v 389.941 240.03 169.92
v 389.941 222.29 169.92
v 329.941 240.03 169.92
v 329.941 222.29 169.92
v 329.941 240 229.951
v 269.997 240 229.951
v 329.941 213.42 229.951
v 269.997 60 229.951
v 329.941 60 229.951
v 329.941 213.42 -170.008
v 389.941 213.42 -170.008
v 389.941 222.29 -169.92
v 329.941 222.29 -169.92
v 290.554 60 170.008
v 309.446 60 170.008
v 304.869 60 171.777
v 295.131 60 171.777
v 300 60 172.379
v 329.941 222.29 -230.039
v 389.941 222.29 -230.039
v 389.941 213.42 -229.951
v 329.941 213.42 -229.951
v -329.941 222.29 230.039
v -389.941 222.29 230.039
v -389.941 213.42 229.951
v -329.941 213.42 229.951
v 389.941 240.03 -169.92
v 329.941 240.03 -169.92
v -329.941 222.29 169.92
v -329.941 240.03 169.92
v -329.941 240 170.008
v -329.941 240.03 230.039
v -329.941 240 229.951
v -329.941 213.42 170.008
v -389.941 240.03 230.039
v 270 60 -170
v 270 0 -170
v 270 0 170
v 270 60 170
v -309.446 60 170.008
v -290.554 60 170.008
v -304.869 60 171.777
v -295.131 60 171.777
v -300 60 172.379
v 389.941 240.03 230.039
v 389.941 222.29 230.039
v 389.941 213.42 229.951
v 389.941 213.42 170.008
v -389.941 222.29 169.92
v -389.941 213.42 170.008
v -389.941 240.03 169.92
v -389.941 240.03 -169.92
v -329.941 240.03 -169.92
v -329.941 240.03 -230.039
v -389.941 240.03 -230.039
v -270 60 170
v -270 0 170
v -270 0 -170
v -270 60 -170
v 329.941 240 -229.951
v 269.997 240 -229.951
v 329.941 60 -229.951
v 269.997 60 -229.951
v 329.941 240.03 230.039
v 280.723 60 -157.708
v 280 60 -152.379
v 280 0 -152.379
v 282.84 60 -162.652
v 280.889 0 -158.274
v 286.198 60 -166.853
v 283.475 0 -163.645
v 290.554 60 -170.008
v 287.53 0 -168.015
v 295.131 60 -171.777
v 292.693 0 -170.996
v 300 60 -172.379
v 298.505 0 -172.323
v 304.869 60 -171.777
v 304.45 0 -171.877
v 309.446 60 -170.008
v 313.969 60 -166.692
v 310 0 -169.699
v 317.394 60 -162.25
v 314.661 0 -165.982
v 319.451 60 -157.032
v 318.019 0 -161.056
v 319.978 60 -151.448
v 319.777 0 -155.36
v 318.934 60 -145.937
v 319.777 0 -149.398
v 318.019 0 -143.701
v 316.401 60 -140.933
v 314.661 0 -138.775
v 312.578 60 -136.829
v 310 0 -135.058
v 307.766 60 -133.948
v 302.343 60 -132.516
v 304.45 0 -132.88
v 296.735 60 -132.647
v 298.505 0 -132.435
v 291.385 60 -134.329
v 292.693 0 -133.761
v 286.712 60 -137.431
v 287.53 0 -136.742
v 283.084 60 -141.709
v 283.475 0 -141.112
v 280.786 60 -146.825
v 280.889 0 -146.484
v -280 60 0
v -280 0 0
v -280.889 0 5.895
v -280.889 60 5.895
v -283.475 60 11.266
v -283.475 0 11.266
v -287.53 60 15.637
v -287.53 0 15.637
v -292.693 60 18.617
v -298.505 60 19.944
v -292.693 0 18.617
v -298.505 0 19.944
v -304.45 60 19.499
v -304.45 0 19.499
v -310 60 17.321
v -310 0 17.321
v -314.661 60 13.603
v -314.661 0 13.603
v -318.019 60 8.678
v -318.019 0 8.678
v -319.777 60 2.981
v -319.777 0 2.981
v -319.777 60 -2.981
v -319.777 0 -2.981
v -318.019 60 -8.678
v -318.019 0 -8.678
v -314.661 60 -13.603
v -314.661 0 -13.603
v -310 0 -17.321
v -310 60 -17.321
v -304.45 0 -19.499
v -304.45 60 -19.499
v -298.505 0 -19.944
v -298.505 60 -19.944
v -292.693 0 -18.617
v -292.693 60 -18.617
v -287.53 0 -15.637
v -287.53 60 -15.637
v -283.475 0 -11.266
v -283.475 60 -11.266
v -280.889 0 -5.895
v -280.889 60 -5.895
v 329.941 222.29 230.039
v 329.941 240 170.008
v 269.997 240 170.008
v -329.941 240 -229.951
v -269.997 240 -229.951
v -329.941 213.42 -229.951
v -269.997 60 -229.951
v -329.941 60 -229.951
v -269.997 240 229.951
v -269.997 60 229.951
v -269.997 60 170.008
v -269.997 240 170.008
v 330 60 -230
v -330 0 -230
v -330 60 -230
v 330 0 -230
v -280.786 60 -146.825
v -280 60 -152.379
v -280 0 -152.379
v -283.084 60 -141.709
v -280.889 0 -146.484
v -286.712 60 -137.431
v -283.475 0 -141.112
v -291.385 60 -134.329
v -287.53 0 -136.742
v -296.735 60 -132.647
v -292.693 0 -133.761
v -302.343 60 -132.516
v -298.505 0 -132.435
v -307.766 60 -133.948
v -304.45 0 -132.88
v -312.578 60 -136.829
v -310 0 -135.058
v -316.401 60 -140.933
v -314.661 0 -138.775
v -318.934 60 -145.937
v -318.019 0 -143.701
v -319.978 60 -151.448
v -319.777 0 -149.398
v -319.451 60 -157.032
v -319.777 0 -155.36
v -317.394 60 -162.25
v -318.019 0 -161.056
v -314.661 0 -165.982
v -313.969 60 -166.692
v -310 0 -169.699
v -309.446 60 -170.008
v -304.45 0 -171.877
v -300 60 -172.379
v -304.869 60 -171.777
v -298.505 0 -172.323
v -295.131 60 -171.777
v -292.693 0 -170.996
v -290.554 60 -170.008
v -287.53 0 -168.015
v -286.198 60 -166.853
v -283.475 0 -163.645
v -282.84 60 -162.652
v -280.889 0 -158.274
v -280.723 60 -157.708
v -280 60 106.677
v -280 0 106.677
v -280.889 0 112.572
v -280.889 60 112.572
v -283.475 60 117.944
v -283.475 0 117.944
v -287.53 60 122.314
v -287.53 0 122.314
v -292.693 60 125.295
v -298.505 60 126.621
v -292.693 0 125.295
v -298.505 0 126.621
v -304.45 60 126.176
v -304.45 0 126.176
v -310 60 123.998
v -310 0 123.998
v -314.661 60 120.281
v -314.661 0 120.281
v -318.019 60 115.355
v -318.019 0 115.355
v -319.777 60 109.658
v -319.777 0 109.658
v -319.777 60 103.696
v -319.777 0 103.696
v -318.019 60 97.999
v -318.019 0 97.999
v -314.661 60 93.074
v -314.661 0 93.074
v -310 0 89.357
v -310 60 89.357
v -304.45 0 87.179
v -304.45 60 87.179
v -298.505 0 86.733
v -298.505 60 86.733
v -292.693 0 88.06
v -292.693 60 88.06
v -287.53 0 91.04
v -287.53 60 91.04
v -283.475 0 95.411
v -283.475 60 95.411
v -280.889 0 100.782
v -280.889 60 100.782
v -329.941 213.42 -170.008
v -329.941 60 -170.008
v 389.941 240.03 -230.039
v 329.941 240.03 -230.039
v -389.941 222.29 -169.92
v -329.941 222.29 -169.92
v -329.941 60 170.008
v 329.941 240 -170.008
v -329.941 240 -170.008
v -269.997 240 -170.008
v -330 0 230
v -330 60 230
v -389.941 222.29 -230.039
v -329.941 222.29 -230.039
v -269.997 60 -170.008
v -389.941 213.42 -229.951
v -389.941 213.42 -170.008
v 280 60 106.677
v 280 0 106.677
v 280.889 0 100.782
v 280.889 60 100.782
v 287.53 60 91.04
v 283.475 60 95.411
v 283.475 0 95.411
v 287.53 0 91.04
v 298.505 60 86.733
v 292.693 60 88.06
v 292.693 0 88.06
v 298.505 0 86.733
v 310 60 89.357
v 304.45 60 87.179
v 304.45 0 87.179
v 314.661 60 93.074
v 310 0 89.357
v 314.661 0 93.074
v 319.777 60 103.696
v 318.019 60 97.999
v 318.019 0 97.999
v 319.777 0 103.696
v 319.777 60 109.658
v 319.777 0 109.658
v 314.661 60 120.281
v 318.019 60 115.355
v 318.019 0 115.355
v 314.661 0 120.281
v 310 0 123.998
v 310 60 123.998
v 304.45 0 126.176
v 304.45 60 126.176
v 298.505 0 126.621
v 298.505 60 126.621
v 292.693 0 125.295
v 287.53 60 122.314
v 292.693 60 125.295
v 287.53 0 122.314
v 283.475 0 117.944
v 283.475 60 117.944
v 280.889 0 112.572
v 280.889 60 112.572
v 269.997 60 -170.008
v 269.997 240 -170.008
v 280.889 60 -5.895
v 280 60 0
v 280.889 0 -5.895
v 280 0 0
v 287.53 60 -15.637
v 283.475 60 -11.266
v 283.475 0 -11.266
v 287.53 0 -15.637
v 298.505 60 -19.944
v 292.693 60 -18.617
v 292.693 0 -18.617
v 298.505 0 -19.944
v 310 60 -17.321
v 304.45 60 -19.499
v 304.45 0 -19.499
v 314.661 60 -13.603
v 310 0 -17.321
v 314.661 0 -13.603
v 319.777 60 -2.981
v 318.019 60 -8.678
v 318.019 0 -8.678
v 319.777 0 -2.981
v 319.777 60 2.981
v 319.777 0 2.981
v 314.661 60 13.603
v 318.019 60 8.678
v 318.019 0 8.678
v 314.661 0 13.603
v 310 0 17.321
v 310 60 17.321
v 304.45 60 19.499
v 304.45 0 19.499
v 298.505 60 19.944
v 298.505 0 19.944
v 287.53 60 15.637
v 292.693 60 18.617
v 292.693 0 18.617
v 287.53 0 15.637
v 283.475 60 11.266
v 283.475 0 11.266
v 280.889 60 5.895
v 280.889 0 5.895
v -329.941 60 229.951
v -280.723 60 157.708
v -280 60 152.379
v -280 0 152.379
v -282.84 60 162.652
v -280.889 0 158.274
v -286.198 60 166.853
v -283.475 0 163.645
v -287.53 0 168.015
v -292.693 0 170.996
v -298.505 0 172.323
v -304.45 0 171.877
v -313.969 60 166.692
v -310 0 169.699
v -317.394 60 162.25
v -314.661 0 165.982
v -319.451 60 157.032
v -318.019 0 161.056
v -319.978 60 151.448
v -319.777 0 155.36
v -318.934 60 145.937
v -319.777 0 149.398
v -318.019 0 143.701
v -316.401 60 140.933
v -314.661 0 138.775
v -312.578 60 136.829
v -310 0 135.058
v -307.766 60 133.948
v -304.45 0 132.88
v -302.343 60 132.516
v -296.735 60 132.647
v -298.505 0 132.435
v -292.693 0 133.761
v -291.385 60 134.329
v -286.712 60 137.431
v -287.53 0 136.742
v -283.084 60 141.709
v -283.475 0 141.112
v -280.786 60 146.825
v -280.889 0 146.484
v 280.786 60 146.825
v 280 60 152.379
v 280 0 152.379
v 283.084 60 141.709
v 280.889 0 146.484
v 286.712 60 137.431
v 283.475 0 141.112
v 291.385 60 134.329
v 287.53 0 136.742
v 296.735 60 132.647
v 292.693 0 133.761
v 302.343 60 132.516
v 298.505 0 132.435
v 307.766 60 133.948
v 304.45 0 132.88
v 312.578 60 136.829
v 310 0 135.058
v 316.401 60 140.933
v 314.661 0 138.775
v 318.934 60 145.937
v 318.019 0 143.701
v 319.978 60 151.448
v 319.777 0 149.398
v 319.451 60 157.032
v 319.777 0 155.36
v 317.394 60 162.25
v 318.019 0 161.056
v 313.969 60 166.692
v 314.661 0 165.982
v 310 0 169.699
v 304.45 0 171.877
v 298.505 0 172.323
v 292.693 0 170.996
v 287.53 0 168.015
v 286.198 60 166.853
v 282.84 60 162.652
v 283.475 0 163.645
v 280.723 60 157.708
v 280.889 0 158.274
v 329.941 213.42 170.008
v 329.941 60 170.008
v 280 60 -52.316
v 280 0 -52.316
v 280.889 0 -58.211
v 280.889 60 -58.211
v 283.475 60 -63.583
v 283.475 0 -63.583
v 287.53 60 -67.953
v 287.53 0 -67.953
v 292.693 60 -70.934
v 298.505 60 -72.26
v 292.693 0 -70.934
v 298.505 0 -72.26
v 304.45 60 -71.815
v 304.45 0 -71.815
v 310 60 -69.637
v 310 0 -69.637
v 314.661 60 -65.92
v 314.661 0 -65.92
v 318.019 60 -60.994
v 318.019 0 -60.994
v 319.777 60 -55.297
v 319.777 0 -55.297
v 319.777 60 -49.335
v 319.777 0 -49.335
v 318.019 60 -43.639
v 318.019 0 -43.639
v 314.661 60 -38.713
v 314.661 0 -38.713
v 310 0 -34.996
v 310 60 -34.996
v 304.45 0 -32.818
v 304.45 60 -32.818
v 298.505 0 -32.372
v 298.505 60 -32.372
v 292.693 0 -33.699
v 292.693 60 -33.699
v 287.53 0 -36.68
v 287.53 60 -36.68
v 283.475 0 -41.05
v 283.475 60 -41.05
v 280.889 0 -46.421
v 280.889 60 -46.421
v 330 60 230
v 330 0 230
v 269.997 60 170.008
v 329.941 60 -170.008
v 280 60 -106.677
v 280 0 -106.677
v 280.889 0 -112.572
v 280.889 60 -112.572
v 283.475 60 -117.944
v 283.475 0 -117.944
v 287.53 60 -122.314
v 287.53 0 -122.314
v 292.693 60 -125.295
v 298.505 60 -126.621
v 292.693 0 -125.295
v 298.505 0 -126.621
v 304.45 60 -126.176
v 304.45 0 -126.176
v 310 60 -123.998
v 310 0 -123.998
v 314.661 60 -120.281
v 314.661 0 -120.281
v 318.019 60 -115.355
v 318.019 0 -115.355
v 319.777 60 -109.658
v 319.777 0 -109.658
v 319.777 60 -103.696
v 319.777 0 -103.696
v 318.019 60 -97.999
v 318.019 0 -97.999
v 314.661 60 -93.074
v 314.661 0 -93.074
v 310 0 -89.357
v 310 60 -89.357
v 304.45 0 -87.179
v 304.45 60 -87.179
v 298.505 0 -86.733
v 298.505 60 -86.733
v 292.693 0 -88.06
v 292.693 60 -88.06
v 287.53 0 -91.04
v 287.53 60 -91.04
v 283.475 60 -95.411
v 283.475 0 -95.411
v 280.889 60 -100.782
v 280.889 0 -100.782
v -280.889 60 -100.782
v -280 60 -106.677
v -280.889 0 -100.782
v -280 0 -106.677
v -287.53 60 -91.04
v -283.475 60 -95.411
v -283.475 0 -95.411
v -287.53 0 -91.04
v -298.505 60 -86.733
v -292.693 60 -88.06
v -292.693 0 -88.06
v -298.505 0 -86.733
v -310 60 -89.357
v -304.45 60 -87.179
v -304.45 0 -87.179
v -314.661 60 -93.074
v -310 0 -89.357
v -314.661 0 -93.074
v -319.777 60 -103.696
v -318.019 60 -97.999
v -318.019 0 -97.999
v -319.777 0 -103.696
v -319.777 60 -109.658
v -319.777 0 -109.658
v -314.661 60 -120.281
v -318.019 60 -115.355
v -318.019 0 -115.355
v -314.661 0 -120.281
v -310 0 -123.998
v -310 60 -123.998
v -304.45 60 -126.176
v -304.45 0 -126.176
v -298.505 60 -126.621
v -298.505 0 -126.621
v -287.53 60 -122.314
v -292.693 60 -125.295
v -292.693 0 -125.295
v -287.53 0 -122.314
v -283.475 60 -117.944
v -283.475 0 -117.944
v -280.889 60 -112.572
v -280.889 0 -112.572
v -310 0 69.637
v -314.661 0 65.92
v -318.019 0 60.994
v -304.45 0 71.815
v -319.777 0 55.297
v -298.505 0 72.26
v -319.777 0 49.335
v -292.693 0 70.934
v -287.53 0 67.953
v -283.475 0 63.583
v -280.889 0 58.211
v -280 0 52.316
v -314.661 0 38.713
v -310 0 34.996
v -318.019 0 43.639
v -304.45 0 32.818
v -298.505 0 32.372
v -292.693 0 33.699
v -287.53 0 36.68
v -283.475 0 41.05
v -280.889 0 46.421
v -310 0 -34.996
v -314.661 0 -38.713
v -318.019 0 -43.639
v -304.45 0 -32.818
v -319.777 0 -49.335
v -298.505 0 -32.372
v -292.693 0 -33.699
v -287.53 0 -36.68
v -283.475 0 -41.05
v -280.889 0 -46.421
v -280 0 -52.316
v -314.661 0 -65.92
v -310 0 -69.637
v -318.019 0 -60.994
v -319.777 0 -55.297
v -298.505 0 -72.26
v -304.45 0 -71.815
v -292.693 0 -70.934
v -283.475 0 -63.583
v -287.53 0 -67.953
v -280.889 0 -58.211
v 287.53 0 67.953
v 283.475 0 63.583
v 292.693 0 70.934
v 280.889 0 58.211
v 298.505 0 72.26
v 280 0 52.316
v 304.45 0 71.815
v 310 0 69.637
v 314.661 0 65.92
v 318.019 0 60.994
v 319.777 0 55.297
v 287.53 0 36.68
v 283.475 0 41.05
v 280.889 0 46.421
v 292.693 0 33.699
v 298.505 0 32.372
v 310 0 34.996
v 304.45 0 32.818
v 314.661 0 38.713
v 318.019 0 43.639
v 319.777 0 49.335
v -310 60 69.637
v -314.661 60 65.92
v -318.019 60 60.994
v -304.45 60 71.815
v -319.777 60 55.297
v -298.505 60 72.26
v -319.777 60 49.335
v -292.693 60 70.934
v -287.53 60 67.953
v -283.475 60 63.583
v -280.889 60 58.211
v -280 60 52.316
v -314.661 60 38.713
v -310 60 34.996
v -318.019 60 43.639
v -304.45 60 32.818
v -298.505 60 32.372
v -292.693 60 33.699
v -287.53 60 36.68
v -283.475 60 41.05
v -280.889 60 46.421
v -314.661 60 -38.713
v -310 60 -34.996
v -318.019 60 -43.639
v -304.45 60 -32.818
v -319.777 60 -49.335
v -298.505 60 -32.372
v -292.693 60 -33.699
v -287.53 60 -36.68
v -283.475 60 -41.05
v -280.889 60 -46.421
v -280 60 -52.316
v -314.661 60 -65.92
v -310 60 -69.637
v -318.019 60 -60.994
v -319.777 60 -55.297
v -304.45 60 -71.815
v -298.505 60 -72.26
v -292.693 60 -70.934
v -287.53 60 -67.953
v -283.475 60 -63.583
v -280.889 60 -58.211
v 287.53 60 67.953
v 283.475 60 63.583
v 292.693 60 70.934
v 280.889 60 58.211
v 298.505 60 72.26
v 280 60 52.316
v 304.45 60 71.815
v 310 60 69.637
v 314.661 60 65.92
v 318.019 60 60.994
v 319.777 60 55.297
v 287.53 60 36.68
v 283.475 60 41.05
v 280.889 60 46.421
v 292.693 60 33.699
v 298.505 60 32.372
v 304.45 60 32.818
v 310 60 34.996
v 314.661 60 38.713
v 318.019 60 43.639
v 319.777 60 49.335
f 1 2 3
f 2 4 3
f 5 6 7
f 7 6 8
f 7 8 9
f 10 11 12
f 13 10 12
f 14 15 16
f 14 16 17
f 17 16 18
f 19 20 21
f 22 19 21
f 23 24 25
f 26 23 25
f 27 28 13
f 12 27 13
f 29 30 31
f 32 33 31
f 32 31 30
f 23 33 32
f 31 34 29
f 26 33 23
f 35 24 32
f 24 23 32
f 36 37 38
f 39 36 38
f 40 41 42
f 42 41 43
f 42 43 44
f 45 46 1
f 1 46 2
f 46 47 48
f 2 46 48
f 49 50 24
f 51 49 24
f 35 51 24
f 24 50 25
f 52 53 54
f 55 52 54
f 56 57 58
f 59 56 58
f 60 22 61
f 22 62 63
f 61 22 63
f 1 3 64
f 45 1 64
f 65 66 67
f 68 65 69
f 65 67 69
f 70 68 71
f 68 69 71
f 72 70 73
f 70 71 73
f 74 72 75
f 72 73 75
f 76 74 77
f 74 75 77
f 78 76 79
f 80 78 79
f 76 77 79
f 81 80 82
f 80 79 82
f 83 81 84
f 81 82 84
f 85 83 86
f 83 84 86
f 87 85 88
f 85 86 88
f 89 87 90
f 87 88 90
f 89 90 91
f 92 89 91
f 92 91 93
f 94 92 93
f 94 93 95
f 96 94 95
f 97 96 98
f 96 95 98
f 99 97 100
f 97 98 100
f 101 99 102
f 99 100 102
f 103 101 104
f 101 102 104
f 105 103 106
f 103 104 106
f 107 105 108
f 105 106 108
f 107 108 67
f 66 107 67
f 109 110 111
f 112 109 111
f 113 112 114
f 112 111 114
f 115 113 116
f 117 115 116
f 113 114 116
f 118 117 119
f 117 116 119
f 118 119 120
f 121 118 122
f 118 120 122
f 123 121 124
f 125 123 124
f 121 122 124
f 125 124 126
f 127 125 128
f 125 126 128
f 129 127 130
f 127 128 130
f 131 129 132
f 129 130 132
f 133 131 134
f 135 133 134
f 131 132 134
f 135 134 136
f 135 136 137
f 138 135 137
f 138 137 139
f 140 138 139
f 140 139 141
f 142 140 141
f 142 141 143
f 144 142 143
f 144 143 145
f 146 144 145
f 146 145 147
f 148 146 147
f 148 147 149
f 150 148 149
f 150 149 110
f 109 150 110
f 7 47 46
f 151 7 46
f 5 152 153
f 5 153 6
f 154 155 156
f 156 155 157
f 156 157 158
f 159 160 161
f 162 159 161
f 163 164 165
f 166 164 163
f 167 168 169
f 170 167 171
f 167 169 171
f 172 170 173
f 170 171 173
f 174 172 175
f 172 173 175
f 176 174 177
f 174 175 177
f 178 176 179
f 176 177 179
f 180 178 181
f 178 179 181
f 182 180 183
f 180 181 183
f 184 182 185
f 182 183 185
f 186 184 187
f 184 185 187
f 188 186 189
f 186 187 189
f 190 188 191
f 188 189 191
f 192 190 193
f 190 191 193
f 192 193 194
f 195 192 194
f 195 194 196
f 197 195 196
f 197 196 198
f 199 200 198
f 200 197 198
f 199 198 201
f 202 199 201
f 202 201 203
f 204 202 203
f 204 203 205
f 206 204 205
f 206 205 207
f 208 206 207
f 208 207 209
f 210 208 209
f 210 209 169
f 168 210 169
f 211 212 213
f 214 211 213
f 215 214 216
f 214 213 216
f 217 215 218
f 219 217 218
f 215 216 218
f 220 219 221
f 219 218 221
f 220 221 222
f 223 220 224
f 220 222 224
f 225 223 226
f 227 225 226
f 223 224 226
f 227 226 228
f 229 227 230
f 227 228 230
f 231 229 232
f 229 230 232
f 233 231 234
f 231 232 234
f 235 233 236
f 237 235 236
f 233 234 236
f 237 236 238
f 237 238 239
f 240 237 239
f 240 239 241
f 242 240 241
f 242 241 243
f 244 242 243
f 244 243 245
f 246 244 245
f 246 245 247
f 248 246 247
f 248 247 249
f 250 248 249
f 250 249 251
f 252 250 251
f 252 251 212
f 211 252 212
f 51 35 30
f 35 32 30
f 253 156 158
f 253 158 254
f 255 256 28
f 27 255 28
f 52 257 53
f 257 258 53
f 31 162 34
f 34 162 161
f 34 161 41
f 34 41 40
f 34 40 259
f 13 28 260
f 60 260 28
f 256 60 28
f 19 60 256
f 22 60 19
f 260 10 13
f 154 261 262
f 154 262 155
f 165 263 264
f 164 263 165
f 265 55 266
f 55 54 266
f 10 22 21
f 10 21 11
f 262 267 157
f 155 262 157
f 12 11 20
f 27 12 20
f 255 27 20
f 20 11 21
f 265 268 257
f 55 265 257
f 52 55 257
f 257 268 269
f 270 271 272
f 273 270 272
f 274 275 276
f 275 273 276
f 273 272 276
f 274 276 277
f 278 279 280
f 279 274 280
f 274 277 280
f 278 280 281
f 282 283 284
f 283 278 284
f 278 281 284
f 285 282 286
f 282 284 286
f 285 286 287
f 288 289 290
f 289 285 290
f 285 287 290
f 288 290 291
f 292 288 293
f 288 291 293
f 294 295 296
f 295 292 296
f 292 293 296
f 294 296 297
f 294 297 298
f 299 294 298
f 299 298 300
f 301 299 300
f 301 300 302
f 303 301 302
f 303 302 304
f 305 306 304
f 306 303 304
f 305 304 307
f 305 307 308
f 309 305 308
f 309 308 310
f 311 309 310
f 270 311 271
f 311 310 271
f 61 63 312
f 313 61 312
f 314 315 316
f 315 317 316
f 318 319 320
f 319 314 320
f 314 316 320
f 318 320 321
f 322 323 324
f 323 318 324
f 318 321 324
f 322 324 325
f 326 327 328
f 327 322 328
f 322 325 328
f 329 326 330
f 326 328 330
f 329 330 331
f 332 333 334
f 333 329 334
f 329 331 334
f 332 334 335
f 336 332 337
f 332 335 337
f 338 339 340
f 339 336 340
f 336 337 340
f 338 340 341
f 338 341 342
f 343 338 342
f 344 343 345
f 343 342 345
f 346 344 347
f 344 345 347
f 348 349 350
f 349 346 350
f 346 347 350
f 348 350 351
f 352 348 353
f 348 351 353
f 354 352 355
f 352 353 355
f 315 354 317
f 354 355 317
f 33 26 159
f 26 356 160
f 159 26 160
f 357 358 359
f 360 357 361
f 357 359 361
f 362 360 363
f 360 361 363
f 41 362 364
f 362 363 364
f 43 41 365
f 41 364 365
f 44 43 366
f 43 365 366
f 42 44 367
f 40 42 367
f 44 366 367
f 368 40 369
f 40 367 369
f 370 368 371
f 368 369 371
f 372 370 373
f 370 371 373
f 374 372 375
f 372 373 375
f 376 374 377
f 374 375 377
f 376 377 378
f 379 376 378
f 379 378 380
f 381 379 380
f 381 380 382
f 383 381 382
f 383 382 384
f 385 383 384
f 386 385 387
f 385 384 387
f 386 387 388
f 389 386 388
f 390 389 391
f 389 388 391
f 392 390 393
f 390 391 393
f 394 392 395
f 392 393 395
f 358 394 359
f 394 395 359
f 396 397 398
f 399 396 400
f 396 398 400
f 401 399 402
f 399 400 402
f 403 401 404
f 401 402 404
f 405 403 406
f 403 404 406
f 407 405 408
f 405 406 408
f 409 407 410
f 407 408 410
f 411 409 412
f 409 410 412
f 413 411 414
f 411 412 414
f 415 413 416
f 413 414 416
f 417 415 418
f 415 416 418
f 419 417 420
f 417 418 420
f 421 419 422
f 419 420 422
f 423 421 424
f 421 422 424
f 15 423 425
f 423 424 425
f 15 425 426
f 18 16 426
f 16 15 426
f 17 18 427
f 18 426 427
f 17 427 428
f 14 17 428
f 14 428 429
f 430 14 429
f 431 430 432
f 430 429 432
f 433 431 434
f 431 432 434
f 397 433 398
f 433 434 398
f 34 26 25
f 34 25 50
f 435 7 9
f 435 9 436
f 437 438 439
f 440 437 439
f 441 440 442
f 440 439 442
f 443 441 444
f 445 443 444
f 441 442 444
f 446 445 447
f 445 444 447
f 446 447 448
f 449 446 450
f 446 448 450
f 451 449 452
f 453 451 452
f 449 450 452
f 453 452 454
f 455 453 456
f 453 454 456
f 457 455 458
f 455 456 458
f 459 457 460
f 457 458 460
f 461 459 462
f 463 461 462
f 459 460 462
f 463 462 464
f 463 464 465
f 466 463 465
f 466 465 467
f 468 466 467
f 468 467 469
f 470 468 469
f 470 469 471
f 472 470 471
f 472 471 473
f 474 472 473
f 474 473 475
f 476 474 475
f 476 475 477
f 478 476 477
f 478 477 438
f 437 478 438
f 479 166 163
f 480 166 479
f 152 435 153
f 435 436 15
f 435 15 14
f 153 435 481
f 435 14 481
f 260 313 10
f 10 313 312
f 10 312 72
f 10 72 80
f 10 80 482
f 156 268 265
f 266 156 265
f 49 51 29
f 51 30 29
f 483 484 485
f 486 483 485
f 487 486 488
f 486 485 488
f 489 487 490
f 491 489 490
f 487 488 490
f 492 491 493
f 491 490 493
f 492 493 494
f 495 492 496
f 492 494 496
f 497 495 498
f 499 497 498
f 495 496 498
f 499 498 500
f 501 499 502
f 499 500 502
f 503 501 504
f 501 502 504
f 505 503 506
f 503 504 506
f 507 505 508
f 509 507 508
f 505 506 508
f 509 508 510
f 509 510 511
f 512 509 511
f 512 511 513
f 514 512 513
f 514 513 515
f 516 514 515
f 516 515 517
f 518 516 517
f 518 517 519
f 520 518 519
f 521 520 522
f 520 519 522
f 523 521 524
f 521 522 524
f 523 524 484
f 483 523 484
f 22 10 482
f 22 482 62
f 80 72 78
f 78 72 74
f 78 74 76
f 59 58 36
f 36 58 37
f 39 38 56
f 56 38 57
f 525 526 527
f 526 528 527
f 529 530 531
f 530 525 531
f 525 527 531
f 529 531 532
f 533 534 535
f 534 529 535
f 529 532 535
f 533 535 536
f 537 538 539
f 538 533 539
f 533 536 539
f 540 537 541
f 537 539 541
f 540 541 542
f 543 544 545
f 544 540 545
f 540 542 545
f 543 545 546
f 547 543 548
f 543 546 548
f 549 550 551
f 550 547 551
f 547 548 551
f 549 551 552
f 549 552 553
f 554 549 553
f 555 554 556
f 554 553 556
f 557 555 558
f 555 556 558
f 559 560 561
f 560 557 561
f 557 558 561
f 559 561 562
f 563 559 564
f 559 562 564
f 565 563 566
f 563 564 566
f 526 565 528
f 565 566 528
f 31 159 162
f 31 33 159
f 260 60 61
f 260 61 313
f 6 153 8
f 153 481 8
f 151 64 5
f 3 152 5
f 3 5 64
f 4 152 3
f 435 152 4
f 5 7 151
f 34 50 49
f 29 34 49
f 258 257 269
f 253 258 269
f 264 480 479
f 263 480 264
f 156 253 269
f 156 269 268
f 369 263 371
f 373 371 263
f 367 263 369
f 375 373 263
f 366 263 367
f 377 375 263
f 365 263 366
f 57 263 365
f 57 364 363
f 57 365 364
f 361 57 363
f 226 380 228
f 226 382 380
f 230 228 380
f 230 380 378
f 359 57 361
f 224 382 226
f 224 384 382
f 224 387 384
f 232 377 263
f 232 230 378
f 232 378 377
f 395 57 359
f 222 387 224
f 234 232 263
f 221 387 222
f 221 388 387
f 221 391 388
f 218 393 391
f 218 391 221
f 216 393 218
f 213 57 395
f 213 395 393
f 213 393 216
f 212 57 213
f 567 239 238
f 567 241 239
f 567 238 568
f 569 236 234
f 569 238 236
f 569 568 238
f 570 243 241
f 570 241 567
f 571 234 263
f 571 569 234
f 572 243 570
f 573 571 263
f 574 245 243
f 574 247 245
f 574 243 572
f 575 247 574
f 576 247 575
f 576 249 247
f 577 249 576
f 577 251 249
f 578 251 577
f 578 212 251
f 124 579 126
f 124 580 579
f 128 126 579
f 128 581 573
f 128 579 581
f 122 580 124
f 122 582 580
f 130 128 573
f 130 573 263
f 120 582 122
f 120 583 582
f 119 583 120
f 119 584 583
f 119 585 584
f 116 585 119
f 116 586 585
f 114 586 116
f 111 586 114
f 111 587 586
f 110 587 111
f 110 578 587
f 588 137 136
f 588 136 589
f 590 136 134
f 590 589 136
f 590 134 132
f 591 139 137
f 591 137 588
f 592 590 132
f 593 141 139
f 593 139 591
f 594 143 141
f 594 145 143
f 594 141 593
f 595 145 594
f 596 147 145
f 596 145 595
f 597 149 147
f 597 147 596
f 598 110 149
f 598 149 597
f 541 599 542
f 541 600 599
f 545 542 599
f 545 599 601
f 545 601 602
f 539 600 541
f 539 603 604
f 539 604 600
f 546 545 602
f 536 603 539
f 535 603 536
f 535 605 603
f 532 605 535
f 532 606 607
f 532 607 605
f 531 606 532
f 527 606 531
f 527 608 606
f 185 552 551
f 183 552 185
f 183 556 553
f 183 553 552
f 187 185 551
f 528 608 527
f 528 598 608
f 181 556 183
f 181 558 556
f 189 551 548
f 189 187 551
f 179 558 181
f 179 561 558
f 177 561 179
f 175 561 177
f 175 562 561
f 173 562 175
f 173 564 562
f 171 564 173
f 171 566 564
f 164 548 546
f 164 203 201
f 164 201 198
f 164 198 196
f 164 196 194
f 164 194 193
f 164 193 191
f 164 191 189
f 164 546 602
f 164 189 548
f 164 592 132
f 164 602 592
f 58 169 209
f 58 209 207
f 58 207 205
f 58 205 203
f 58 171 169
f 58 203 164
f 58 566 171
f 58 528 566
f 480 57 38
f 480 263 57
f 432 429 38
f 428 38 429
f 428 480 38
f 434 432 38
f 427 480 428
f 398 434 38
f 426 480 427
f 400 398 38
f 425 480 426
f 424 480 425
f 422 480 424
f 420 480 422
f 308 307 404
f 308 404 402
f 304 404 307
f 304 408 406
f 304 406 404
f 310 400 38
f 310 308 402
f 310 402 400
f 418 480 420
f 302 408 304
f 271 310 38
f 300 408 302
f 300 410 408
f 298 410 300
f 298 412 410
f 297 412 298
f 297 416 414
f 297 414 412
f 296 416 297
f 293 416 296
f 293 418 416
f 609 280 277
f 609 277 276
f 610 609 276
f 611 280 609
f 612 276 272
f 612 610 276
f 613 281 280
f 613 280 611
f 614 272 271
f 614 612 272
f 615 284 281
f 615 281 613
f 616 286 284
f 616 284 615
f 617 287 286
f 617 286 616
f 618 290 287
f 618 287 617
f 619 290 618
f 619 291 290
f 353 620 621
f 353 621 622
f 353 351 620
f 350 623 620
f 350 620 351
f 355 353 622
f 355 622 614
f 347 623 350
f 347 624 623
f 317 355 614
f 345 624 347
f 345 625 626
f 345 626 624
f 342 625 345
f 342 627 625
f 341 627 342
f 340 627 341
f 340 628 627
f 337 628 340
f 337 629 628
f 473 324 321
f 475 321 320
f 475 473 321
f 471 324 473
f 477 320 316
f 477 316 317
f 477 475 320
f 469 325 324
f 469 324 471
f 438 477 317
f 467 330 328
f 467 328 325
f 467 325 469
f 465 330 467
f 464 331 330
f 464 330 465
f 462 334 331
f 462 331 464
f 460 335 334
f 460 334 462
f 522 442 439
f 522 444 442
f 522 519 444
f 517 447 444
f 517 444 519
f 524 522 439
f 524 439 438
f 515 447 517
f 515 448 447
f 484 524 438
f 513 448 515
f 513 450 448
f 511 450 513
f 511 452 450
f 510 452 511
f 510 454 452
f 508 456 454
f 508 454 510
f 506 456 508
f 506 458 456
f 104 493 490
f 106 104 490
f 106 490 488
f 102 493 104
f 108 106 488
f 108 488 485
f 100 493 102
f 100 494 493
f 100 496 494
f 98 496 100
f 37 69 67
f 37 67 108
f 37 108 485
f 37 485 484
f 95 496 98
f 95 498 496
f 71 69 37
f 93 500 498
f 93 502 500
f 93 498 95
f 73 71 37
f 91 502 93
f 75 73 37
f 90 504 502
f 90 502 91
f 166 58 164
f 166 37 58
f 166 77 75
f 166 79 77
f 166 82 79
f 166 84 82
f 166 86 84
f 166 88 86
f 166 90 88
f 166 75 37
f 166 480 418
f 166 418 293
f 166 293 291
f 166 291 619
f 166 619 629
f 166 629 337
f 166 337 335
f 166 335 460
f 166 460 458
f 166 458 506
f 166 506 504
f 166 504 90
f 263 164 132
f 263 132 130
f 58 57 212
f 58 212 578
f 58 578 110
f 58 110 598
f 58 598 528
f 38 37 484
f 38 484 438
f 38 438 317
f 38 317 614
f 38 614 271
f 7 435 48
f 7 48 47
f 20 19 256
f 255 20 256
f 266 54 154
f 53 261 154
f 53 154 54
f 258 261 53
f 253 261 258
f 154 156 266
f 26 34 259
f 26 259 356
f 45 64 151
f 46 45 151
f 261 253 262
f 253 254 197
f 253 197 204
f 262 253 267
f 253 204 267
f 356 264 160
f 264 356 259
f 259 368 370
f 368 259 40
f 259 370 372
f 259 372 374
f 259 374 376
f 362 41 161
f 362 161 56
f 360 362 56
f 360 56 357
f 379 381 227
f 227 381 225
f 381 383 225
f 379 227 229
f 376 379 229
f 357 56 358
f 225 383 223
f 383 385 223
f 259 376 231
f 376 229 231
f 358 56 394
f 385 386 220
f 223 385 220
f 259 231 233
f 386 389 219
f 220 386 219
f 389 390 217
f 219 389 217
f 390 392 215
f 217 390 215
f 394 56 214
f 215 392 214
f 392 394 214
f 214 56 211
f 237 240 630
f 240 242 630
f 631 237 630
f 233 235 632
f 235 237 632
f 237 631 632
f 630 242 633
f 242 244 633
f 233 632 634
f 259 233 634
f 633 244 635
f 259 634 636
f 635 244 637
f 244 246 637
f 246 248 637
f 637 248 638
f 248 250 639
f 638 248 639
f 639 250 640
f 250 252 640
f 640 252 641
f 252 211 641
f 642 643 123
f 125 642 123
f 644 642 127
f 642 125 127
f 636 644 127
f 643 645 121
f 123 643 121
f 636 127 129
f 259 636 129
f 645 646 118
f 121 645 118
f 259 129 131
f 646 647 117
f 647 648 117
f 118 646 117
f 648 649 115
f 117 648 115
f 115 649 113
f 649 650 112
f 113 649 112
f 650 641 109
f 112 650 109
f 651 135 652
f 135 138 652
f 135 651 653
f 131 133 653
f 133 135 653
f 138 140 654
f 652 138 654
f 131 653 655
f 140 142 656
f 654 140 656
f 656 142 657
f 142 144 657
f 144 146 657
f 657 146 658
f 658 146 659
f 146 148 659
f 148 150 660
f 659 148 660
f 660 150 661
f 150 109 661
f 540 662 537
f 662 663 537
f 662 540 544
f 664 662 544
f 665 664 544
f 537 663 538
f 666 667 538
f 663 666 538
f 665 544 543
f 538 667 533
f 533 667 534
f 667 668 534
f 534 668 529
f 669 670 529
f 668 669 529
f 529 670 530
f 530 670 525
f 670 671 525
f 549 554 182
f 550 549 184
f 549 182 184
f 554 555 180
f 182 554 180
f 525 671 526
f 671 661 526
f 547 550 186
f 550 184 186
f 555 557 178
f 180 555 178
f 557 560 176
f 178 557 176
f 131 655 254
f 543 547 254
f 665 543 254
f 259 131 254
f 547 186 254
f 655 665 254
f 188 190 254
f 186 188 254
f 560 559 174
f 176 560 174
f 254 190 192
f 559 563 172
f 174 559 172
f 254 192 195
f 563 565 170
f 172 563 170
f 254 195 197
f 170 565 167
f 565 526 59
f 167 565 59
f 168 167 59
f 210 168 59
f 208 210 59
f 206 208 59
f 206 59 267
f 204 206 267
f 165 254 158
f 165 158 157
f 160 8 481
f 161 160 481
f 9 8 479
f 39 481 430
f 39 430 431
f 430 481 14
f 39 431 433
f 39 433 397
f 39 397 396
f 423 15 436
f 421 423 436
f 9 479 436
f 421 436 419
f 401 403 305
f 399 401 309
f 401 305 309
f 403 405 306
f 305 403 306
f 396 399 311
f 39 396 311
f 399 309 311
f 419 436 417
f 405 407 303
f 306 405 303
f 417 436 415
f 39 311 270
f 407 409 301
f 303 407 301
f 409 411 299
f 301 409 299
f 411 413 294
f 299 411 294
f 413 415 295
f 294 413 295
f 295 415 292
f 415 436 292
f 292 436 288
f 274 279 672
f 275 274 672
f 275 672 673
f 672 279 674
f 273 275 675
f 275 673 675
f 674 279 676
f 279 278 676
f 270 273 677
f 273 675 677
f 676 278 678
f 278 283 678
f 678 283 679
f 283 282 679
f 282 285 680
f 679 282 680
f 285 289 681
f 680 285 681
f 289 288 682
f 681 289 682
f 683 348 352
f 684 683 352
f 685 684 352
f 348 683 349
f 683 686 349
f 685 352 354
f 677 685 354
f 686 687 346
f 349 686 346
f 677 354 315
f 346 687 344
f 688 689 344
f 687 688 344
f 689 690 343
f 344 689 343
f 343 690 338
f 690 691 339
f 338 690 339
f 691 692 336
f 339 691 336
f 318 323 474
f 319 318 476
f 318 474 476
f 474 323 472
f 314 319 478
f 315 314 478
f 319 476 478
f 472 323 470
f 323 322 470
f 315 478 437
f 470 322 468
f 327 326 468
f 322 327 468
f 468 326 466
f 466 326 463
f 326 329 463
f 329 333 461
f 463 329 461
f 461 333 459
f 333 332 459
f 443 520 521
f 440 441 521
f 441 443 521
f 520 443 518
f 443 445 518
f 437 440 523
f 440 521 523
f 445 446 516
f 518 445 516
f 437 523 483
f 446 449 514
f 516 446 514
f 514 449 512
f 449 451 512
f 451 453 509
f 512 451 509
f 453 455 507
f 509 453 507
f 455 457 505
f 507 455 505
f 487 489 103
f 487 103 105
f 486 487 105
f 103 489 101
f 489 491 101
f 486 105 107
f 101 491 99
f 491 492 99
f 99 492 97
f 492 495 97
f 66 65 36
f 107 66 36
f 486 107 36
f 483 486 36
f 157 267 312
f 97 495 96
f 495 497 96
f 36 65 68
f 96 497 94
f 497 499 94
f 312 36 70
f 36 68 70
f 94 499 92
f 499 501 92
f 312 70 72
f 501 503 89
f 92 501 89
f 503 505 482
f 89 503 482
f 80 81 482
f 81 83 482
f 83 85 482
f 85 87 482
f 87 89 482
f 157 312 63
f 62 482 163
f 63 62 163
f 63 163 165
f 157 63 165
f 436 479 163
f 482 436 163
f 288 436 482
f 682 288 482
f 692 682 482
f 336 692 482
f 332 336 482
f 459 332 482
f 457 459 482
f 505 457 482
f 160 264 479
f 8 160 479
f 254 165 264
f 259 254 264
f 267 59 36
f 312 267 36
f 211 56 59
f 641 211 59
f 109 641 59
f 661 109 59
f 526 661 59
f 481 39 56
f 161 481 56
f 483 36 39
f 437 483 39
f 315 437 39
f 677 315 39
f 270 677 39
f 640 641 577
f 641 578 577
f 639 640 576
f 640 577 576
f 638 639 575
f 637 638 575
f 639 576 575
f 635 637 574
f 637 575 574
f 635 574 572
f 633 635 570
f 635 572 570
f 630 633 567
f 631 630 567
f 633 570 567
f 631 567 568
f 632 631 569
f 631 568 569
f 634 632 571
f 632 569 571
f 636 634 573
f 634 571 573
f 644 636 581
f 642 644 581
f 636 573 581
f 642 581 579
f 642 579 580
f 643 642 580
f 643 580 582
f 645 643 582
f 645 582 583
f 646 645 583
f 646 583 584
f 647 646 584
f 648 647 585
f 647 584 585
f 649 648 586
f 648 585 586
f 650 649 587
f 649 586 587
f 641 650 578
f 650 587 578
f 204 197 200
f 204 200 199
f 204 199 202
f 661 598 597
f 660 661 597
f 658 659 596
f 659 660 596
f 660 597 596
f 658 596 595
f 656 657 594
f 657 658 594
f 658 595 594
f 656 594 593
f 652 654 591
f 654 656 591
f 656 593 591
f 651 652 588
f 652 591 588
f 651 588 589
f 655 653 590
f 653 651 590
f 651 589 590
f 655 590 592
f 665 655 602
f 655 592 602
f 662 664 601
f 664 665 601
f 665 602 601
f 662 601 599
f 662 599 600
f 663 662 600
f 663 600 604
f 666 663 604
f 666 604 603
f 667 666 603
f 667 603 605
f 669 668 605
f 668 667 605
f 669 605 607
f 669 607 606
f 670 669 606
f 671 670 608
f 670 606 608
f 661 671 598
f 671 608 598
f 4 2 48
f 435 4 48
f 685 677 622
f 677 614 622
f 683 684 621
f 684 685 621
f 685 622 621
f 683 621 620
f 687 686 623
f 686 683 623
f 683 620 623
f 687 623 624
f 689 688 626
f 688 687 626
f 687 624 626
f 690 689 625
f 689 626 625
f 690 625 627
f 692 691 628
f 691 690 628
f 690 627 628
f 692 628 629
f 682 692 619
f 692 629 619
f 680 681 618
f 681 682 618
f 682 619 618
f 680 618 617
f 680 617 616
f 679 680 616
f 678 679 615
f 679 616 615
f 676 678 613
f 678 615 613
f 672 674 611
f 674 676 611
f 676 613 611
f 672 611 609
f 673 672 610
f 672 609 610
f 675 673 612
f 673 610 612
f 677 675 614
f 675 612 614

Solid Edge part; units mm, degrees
sketch "Sketch1" plane through (0, 0, 0) normal (0, -1, 0) x (1, 0, 0)
  line L0 (270, 170) -> (-270, 170)
  line L1 (-270, 170) -> (-270, -170)
  line L2 (-270, -170) -> (270, -170)
  line L3 (270, -170) -> (270, 170)
  line L4 (330, 230) -> (-330, 230)
  line L5 (-330, 230) -> (-330, -230)
  line L6 (-330, -230) -> (330, -230)
  line L7 (330, -230) -> (330, 230)
  dimension "D1" = 60
extrude "Protrusion1" add sketch "Sketch1" against normal blind 60
sketch "Sketch2" plane through (0, 60, 0) normal (0, 1, 0) x (1, 0, 0)
  line L0 (269.9973, 170.0076) -> (329.9407, 170.0076)
  line L1 (329.9407, 170.0076) -> (329.9407, 229.951)
  line L2 (329.9407, 229.951) -> (269.9973, 229.951)
  line L3 (269.9973, 229.951) -> (269.9973, 170.0076)
extrude "ExtrudedProtrusion_2" add sketch "Sketch2" along normal blind 180
sketch "Sketch3" plane through (329.9407, 150, -199.9793) normal (1, 0, 0) x (0, 0, 1)
  line L0 (-29.9717, -63.4202) -> (29.9717, -63.4202)
  line L1 (29.9717, -63.4202) -> (30.0593, -72.2902)
  line L2 (30.0593, -90.0301) -> (30.0593, -72.2902)
  line L3 (-30.0593, -90.0301) -> (30.0593, -90.0301)
  line L4 (-30.0593, -72.2902) -> (-30.0593, -90.0301)
  line L5 (-30.0593, -72.2902) -> (-29.9717, -63.4202)
extrude "ExtrudedProtrusion_3" add sketch "Sketch3" along normal blind 60
mirror "Mirror1" about plane through (0, 0, 0) normal (-1, 0, 0) of "ExtrudedProtrusion_2", "ExtrudedProtrusion_3"
mirror "Mirror2" about plane through (0, 0, 0) normal (0, 0, 1) of "ExtrudedProtrusion_2", "ExtrudedProtrusion_3"
mirror "Mirror3" about plane through (0, 0, 0) normal (0, 0, 1) of "Mirror1"
sketch "Sketch4" plane through (0, 0, 0) normal (0, -1, 0) x (1, 0, 0)
  circle A0 centre (-300, 152.3787) radius 20
  circle A1 centre (-300, 106.6771) radius 20
  circle A2 centre (-300, 52.3163) radius 20
  circle A3 centre (-300, 0) radius 20
extrude "ExtrudedCutout_8" cut sketch "Sketch4" against normal blind 60
mirror "Mirror4" about plane through (0, 0, 0) normal (-1, 0, 0) of "ExtrudedCutout_8"
mirror "Mirror5" about plane through (0, 0, 0) normal (0, 0, -1) of "ExtrudedCutout_8", "Mirror4"
